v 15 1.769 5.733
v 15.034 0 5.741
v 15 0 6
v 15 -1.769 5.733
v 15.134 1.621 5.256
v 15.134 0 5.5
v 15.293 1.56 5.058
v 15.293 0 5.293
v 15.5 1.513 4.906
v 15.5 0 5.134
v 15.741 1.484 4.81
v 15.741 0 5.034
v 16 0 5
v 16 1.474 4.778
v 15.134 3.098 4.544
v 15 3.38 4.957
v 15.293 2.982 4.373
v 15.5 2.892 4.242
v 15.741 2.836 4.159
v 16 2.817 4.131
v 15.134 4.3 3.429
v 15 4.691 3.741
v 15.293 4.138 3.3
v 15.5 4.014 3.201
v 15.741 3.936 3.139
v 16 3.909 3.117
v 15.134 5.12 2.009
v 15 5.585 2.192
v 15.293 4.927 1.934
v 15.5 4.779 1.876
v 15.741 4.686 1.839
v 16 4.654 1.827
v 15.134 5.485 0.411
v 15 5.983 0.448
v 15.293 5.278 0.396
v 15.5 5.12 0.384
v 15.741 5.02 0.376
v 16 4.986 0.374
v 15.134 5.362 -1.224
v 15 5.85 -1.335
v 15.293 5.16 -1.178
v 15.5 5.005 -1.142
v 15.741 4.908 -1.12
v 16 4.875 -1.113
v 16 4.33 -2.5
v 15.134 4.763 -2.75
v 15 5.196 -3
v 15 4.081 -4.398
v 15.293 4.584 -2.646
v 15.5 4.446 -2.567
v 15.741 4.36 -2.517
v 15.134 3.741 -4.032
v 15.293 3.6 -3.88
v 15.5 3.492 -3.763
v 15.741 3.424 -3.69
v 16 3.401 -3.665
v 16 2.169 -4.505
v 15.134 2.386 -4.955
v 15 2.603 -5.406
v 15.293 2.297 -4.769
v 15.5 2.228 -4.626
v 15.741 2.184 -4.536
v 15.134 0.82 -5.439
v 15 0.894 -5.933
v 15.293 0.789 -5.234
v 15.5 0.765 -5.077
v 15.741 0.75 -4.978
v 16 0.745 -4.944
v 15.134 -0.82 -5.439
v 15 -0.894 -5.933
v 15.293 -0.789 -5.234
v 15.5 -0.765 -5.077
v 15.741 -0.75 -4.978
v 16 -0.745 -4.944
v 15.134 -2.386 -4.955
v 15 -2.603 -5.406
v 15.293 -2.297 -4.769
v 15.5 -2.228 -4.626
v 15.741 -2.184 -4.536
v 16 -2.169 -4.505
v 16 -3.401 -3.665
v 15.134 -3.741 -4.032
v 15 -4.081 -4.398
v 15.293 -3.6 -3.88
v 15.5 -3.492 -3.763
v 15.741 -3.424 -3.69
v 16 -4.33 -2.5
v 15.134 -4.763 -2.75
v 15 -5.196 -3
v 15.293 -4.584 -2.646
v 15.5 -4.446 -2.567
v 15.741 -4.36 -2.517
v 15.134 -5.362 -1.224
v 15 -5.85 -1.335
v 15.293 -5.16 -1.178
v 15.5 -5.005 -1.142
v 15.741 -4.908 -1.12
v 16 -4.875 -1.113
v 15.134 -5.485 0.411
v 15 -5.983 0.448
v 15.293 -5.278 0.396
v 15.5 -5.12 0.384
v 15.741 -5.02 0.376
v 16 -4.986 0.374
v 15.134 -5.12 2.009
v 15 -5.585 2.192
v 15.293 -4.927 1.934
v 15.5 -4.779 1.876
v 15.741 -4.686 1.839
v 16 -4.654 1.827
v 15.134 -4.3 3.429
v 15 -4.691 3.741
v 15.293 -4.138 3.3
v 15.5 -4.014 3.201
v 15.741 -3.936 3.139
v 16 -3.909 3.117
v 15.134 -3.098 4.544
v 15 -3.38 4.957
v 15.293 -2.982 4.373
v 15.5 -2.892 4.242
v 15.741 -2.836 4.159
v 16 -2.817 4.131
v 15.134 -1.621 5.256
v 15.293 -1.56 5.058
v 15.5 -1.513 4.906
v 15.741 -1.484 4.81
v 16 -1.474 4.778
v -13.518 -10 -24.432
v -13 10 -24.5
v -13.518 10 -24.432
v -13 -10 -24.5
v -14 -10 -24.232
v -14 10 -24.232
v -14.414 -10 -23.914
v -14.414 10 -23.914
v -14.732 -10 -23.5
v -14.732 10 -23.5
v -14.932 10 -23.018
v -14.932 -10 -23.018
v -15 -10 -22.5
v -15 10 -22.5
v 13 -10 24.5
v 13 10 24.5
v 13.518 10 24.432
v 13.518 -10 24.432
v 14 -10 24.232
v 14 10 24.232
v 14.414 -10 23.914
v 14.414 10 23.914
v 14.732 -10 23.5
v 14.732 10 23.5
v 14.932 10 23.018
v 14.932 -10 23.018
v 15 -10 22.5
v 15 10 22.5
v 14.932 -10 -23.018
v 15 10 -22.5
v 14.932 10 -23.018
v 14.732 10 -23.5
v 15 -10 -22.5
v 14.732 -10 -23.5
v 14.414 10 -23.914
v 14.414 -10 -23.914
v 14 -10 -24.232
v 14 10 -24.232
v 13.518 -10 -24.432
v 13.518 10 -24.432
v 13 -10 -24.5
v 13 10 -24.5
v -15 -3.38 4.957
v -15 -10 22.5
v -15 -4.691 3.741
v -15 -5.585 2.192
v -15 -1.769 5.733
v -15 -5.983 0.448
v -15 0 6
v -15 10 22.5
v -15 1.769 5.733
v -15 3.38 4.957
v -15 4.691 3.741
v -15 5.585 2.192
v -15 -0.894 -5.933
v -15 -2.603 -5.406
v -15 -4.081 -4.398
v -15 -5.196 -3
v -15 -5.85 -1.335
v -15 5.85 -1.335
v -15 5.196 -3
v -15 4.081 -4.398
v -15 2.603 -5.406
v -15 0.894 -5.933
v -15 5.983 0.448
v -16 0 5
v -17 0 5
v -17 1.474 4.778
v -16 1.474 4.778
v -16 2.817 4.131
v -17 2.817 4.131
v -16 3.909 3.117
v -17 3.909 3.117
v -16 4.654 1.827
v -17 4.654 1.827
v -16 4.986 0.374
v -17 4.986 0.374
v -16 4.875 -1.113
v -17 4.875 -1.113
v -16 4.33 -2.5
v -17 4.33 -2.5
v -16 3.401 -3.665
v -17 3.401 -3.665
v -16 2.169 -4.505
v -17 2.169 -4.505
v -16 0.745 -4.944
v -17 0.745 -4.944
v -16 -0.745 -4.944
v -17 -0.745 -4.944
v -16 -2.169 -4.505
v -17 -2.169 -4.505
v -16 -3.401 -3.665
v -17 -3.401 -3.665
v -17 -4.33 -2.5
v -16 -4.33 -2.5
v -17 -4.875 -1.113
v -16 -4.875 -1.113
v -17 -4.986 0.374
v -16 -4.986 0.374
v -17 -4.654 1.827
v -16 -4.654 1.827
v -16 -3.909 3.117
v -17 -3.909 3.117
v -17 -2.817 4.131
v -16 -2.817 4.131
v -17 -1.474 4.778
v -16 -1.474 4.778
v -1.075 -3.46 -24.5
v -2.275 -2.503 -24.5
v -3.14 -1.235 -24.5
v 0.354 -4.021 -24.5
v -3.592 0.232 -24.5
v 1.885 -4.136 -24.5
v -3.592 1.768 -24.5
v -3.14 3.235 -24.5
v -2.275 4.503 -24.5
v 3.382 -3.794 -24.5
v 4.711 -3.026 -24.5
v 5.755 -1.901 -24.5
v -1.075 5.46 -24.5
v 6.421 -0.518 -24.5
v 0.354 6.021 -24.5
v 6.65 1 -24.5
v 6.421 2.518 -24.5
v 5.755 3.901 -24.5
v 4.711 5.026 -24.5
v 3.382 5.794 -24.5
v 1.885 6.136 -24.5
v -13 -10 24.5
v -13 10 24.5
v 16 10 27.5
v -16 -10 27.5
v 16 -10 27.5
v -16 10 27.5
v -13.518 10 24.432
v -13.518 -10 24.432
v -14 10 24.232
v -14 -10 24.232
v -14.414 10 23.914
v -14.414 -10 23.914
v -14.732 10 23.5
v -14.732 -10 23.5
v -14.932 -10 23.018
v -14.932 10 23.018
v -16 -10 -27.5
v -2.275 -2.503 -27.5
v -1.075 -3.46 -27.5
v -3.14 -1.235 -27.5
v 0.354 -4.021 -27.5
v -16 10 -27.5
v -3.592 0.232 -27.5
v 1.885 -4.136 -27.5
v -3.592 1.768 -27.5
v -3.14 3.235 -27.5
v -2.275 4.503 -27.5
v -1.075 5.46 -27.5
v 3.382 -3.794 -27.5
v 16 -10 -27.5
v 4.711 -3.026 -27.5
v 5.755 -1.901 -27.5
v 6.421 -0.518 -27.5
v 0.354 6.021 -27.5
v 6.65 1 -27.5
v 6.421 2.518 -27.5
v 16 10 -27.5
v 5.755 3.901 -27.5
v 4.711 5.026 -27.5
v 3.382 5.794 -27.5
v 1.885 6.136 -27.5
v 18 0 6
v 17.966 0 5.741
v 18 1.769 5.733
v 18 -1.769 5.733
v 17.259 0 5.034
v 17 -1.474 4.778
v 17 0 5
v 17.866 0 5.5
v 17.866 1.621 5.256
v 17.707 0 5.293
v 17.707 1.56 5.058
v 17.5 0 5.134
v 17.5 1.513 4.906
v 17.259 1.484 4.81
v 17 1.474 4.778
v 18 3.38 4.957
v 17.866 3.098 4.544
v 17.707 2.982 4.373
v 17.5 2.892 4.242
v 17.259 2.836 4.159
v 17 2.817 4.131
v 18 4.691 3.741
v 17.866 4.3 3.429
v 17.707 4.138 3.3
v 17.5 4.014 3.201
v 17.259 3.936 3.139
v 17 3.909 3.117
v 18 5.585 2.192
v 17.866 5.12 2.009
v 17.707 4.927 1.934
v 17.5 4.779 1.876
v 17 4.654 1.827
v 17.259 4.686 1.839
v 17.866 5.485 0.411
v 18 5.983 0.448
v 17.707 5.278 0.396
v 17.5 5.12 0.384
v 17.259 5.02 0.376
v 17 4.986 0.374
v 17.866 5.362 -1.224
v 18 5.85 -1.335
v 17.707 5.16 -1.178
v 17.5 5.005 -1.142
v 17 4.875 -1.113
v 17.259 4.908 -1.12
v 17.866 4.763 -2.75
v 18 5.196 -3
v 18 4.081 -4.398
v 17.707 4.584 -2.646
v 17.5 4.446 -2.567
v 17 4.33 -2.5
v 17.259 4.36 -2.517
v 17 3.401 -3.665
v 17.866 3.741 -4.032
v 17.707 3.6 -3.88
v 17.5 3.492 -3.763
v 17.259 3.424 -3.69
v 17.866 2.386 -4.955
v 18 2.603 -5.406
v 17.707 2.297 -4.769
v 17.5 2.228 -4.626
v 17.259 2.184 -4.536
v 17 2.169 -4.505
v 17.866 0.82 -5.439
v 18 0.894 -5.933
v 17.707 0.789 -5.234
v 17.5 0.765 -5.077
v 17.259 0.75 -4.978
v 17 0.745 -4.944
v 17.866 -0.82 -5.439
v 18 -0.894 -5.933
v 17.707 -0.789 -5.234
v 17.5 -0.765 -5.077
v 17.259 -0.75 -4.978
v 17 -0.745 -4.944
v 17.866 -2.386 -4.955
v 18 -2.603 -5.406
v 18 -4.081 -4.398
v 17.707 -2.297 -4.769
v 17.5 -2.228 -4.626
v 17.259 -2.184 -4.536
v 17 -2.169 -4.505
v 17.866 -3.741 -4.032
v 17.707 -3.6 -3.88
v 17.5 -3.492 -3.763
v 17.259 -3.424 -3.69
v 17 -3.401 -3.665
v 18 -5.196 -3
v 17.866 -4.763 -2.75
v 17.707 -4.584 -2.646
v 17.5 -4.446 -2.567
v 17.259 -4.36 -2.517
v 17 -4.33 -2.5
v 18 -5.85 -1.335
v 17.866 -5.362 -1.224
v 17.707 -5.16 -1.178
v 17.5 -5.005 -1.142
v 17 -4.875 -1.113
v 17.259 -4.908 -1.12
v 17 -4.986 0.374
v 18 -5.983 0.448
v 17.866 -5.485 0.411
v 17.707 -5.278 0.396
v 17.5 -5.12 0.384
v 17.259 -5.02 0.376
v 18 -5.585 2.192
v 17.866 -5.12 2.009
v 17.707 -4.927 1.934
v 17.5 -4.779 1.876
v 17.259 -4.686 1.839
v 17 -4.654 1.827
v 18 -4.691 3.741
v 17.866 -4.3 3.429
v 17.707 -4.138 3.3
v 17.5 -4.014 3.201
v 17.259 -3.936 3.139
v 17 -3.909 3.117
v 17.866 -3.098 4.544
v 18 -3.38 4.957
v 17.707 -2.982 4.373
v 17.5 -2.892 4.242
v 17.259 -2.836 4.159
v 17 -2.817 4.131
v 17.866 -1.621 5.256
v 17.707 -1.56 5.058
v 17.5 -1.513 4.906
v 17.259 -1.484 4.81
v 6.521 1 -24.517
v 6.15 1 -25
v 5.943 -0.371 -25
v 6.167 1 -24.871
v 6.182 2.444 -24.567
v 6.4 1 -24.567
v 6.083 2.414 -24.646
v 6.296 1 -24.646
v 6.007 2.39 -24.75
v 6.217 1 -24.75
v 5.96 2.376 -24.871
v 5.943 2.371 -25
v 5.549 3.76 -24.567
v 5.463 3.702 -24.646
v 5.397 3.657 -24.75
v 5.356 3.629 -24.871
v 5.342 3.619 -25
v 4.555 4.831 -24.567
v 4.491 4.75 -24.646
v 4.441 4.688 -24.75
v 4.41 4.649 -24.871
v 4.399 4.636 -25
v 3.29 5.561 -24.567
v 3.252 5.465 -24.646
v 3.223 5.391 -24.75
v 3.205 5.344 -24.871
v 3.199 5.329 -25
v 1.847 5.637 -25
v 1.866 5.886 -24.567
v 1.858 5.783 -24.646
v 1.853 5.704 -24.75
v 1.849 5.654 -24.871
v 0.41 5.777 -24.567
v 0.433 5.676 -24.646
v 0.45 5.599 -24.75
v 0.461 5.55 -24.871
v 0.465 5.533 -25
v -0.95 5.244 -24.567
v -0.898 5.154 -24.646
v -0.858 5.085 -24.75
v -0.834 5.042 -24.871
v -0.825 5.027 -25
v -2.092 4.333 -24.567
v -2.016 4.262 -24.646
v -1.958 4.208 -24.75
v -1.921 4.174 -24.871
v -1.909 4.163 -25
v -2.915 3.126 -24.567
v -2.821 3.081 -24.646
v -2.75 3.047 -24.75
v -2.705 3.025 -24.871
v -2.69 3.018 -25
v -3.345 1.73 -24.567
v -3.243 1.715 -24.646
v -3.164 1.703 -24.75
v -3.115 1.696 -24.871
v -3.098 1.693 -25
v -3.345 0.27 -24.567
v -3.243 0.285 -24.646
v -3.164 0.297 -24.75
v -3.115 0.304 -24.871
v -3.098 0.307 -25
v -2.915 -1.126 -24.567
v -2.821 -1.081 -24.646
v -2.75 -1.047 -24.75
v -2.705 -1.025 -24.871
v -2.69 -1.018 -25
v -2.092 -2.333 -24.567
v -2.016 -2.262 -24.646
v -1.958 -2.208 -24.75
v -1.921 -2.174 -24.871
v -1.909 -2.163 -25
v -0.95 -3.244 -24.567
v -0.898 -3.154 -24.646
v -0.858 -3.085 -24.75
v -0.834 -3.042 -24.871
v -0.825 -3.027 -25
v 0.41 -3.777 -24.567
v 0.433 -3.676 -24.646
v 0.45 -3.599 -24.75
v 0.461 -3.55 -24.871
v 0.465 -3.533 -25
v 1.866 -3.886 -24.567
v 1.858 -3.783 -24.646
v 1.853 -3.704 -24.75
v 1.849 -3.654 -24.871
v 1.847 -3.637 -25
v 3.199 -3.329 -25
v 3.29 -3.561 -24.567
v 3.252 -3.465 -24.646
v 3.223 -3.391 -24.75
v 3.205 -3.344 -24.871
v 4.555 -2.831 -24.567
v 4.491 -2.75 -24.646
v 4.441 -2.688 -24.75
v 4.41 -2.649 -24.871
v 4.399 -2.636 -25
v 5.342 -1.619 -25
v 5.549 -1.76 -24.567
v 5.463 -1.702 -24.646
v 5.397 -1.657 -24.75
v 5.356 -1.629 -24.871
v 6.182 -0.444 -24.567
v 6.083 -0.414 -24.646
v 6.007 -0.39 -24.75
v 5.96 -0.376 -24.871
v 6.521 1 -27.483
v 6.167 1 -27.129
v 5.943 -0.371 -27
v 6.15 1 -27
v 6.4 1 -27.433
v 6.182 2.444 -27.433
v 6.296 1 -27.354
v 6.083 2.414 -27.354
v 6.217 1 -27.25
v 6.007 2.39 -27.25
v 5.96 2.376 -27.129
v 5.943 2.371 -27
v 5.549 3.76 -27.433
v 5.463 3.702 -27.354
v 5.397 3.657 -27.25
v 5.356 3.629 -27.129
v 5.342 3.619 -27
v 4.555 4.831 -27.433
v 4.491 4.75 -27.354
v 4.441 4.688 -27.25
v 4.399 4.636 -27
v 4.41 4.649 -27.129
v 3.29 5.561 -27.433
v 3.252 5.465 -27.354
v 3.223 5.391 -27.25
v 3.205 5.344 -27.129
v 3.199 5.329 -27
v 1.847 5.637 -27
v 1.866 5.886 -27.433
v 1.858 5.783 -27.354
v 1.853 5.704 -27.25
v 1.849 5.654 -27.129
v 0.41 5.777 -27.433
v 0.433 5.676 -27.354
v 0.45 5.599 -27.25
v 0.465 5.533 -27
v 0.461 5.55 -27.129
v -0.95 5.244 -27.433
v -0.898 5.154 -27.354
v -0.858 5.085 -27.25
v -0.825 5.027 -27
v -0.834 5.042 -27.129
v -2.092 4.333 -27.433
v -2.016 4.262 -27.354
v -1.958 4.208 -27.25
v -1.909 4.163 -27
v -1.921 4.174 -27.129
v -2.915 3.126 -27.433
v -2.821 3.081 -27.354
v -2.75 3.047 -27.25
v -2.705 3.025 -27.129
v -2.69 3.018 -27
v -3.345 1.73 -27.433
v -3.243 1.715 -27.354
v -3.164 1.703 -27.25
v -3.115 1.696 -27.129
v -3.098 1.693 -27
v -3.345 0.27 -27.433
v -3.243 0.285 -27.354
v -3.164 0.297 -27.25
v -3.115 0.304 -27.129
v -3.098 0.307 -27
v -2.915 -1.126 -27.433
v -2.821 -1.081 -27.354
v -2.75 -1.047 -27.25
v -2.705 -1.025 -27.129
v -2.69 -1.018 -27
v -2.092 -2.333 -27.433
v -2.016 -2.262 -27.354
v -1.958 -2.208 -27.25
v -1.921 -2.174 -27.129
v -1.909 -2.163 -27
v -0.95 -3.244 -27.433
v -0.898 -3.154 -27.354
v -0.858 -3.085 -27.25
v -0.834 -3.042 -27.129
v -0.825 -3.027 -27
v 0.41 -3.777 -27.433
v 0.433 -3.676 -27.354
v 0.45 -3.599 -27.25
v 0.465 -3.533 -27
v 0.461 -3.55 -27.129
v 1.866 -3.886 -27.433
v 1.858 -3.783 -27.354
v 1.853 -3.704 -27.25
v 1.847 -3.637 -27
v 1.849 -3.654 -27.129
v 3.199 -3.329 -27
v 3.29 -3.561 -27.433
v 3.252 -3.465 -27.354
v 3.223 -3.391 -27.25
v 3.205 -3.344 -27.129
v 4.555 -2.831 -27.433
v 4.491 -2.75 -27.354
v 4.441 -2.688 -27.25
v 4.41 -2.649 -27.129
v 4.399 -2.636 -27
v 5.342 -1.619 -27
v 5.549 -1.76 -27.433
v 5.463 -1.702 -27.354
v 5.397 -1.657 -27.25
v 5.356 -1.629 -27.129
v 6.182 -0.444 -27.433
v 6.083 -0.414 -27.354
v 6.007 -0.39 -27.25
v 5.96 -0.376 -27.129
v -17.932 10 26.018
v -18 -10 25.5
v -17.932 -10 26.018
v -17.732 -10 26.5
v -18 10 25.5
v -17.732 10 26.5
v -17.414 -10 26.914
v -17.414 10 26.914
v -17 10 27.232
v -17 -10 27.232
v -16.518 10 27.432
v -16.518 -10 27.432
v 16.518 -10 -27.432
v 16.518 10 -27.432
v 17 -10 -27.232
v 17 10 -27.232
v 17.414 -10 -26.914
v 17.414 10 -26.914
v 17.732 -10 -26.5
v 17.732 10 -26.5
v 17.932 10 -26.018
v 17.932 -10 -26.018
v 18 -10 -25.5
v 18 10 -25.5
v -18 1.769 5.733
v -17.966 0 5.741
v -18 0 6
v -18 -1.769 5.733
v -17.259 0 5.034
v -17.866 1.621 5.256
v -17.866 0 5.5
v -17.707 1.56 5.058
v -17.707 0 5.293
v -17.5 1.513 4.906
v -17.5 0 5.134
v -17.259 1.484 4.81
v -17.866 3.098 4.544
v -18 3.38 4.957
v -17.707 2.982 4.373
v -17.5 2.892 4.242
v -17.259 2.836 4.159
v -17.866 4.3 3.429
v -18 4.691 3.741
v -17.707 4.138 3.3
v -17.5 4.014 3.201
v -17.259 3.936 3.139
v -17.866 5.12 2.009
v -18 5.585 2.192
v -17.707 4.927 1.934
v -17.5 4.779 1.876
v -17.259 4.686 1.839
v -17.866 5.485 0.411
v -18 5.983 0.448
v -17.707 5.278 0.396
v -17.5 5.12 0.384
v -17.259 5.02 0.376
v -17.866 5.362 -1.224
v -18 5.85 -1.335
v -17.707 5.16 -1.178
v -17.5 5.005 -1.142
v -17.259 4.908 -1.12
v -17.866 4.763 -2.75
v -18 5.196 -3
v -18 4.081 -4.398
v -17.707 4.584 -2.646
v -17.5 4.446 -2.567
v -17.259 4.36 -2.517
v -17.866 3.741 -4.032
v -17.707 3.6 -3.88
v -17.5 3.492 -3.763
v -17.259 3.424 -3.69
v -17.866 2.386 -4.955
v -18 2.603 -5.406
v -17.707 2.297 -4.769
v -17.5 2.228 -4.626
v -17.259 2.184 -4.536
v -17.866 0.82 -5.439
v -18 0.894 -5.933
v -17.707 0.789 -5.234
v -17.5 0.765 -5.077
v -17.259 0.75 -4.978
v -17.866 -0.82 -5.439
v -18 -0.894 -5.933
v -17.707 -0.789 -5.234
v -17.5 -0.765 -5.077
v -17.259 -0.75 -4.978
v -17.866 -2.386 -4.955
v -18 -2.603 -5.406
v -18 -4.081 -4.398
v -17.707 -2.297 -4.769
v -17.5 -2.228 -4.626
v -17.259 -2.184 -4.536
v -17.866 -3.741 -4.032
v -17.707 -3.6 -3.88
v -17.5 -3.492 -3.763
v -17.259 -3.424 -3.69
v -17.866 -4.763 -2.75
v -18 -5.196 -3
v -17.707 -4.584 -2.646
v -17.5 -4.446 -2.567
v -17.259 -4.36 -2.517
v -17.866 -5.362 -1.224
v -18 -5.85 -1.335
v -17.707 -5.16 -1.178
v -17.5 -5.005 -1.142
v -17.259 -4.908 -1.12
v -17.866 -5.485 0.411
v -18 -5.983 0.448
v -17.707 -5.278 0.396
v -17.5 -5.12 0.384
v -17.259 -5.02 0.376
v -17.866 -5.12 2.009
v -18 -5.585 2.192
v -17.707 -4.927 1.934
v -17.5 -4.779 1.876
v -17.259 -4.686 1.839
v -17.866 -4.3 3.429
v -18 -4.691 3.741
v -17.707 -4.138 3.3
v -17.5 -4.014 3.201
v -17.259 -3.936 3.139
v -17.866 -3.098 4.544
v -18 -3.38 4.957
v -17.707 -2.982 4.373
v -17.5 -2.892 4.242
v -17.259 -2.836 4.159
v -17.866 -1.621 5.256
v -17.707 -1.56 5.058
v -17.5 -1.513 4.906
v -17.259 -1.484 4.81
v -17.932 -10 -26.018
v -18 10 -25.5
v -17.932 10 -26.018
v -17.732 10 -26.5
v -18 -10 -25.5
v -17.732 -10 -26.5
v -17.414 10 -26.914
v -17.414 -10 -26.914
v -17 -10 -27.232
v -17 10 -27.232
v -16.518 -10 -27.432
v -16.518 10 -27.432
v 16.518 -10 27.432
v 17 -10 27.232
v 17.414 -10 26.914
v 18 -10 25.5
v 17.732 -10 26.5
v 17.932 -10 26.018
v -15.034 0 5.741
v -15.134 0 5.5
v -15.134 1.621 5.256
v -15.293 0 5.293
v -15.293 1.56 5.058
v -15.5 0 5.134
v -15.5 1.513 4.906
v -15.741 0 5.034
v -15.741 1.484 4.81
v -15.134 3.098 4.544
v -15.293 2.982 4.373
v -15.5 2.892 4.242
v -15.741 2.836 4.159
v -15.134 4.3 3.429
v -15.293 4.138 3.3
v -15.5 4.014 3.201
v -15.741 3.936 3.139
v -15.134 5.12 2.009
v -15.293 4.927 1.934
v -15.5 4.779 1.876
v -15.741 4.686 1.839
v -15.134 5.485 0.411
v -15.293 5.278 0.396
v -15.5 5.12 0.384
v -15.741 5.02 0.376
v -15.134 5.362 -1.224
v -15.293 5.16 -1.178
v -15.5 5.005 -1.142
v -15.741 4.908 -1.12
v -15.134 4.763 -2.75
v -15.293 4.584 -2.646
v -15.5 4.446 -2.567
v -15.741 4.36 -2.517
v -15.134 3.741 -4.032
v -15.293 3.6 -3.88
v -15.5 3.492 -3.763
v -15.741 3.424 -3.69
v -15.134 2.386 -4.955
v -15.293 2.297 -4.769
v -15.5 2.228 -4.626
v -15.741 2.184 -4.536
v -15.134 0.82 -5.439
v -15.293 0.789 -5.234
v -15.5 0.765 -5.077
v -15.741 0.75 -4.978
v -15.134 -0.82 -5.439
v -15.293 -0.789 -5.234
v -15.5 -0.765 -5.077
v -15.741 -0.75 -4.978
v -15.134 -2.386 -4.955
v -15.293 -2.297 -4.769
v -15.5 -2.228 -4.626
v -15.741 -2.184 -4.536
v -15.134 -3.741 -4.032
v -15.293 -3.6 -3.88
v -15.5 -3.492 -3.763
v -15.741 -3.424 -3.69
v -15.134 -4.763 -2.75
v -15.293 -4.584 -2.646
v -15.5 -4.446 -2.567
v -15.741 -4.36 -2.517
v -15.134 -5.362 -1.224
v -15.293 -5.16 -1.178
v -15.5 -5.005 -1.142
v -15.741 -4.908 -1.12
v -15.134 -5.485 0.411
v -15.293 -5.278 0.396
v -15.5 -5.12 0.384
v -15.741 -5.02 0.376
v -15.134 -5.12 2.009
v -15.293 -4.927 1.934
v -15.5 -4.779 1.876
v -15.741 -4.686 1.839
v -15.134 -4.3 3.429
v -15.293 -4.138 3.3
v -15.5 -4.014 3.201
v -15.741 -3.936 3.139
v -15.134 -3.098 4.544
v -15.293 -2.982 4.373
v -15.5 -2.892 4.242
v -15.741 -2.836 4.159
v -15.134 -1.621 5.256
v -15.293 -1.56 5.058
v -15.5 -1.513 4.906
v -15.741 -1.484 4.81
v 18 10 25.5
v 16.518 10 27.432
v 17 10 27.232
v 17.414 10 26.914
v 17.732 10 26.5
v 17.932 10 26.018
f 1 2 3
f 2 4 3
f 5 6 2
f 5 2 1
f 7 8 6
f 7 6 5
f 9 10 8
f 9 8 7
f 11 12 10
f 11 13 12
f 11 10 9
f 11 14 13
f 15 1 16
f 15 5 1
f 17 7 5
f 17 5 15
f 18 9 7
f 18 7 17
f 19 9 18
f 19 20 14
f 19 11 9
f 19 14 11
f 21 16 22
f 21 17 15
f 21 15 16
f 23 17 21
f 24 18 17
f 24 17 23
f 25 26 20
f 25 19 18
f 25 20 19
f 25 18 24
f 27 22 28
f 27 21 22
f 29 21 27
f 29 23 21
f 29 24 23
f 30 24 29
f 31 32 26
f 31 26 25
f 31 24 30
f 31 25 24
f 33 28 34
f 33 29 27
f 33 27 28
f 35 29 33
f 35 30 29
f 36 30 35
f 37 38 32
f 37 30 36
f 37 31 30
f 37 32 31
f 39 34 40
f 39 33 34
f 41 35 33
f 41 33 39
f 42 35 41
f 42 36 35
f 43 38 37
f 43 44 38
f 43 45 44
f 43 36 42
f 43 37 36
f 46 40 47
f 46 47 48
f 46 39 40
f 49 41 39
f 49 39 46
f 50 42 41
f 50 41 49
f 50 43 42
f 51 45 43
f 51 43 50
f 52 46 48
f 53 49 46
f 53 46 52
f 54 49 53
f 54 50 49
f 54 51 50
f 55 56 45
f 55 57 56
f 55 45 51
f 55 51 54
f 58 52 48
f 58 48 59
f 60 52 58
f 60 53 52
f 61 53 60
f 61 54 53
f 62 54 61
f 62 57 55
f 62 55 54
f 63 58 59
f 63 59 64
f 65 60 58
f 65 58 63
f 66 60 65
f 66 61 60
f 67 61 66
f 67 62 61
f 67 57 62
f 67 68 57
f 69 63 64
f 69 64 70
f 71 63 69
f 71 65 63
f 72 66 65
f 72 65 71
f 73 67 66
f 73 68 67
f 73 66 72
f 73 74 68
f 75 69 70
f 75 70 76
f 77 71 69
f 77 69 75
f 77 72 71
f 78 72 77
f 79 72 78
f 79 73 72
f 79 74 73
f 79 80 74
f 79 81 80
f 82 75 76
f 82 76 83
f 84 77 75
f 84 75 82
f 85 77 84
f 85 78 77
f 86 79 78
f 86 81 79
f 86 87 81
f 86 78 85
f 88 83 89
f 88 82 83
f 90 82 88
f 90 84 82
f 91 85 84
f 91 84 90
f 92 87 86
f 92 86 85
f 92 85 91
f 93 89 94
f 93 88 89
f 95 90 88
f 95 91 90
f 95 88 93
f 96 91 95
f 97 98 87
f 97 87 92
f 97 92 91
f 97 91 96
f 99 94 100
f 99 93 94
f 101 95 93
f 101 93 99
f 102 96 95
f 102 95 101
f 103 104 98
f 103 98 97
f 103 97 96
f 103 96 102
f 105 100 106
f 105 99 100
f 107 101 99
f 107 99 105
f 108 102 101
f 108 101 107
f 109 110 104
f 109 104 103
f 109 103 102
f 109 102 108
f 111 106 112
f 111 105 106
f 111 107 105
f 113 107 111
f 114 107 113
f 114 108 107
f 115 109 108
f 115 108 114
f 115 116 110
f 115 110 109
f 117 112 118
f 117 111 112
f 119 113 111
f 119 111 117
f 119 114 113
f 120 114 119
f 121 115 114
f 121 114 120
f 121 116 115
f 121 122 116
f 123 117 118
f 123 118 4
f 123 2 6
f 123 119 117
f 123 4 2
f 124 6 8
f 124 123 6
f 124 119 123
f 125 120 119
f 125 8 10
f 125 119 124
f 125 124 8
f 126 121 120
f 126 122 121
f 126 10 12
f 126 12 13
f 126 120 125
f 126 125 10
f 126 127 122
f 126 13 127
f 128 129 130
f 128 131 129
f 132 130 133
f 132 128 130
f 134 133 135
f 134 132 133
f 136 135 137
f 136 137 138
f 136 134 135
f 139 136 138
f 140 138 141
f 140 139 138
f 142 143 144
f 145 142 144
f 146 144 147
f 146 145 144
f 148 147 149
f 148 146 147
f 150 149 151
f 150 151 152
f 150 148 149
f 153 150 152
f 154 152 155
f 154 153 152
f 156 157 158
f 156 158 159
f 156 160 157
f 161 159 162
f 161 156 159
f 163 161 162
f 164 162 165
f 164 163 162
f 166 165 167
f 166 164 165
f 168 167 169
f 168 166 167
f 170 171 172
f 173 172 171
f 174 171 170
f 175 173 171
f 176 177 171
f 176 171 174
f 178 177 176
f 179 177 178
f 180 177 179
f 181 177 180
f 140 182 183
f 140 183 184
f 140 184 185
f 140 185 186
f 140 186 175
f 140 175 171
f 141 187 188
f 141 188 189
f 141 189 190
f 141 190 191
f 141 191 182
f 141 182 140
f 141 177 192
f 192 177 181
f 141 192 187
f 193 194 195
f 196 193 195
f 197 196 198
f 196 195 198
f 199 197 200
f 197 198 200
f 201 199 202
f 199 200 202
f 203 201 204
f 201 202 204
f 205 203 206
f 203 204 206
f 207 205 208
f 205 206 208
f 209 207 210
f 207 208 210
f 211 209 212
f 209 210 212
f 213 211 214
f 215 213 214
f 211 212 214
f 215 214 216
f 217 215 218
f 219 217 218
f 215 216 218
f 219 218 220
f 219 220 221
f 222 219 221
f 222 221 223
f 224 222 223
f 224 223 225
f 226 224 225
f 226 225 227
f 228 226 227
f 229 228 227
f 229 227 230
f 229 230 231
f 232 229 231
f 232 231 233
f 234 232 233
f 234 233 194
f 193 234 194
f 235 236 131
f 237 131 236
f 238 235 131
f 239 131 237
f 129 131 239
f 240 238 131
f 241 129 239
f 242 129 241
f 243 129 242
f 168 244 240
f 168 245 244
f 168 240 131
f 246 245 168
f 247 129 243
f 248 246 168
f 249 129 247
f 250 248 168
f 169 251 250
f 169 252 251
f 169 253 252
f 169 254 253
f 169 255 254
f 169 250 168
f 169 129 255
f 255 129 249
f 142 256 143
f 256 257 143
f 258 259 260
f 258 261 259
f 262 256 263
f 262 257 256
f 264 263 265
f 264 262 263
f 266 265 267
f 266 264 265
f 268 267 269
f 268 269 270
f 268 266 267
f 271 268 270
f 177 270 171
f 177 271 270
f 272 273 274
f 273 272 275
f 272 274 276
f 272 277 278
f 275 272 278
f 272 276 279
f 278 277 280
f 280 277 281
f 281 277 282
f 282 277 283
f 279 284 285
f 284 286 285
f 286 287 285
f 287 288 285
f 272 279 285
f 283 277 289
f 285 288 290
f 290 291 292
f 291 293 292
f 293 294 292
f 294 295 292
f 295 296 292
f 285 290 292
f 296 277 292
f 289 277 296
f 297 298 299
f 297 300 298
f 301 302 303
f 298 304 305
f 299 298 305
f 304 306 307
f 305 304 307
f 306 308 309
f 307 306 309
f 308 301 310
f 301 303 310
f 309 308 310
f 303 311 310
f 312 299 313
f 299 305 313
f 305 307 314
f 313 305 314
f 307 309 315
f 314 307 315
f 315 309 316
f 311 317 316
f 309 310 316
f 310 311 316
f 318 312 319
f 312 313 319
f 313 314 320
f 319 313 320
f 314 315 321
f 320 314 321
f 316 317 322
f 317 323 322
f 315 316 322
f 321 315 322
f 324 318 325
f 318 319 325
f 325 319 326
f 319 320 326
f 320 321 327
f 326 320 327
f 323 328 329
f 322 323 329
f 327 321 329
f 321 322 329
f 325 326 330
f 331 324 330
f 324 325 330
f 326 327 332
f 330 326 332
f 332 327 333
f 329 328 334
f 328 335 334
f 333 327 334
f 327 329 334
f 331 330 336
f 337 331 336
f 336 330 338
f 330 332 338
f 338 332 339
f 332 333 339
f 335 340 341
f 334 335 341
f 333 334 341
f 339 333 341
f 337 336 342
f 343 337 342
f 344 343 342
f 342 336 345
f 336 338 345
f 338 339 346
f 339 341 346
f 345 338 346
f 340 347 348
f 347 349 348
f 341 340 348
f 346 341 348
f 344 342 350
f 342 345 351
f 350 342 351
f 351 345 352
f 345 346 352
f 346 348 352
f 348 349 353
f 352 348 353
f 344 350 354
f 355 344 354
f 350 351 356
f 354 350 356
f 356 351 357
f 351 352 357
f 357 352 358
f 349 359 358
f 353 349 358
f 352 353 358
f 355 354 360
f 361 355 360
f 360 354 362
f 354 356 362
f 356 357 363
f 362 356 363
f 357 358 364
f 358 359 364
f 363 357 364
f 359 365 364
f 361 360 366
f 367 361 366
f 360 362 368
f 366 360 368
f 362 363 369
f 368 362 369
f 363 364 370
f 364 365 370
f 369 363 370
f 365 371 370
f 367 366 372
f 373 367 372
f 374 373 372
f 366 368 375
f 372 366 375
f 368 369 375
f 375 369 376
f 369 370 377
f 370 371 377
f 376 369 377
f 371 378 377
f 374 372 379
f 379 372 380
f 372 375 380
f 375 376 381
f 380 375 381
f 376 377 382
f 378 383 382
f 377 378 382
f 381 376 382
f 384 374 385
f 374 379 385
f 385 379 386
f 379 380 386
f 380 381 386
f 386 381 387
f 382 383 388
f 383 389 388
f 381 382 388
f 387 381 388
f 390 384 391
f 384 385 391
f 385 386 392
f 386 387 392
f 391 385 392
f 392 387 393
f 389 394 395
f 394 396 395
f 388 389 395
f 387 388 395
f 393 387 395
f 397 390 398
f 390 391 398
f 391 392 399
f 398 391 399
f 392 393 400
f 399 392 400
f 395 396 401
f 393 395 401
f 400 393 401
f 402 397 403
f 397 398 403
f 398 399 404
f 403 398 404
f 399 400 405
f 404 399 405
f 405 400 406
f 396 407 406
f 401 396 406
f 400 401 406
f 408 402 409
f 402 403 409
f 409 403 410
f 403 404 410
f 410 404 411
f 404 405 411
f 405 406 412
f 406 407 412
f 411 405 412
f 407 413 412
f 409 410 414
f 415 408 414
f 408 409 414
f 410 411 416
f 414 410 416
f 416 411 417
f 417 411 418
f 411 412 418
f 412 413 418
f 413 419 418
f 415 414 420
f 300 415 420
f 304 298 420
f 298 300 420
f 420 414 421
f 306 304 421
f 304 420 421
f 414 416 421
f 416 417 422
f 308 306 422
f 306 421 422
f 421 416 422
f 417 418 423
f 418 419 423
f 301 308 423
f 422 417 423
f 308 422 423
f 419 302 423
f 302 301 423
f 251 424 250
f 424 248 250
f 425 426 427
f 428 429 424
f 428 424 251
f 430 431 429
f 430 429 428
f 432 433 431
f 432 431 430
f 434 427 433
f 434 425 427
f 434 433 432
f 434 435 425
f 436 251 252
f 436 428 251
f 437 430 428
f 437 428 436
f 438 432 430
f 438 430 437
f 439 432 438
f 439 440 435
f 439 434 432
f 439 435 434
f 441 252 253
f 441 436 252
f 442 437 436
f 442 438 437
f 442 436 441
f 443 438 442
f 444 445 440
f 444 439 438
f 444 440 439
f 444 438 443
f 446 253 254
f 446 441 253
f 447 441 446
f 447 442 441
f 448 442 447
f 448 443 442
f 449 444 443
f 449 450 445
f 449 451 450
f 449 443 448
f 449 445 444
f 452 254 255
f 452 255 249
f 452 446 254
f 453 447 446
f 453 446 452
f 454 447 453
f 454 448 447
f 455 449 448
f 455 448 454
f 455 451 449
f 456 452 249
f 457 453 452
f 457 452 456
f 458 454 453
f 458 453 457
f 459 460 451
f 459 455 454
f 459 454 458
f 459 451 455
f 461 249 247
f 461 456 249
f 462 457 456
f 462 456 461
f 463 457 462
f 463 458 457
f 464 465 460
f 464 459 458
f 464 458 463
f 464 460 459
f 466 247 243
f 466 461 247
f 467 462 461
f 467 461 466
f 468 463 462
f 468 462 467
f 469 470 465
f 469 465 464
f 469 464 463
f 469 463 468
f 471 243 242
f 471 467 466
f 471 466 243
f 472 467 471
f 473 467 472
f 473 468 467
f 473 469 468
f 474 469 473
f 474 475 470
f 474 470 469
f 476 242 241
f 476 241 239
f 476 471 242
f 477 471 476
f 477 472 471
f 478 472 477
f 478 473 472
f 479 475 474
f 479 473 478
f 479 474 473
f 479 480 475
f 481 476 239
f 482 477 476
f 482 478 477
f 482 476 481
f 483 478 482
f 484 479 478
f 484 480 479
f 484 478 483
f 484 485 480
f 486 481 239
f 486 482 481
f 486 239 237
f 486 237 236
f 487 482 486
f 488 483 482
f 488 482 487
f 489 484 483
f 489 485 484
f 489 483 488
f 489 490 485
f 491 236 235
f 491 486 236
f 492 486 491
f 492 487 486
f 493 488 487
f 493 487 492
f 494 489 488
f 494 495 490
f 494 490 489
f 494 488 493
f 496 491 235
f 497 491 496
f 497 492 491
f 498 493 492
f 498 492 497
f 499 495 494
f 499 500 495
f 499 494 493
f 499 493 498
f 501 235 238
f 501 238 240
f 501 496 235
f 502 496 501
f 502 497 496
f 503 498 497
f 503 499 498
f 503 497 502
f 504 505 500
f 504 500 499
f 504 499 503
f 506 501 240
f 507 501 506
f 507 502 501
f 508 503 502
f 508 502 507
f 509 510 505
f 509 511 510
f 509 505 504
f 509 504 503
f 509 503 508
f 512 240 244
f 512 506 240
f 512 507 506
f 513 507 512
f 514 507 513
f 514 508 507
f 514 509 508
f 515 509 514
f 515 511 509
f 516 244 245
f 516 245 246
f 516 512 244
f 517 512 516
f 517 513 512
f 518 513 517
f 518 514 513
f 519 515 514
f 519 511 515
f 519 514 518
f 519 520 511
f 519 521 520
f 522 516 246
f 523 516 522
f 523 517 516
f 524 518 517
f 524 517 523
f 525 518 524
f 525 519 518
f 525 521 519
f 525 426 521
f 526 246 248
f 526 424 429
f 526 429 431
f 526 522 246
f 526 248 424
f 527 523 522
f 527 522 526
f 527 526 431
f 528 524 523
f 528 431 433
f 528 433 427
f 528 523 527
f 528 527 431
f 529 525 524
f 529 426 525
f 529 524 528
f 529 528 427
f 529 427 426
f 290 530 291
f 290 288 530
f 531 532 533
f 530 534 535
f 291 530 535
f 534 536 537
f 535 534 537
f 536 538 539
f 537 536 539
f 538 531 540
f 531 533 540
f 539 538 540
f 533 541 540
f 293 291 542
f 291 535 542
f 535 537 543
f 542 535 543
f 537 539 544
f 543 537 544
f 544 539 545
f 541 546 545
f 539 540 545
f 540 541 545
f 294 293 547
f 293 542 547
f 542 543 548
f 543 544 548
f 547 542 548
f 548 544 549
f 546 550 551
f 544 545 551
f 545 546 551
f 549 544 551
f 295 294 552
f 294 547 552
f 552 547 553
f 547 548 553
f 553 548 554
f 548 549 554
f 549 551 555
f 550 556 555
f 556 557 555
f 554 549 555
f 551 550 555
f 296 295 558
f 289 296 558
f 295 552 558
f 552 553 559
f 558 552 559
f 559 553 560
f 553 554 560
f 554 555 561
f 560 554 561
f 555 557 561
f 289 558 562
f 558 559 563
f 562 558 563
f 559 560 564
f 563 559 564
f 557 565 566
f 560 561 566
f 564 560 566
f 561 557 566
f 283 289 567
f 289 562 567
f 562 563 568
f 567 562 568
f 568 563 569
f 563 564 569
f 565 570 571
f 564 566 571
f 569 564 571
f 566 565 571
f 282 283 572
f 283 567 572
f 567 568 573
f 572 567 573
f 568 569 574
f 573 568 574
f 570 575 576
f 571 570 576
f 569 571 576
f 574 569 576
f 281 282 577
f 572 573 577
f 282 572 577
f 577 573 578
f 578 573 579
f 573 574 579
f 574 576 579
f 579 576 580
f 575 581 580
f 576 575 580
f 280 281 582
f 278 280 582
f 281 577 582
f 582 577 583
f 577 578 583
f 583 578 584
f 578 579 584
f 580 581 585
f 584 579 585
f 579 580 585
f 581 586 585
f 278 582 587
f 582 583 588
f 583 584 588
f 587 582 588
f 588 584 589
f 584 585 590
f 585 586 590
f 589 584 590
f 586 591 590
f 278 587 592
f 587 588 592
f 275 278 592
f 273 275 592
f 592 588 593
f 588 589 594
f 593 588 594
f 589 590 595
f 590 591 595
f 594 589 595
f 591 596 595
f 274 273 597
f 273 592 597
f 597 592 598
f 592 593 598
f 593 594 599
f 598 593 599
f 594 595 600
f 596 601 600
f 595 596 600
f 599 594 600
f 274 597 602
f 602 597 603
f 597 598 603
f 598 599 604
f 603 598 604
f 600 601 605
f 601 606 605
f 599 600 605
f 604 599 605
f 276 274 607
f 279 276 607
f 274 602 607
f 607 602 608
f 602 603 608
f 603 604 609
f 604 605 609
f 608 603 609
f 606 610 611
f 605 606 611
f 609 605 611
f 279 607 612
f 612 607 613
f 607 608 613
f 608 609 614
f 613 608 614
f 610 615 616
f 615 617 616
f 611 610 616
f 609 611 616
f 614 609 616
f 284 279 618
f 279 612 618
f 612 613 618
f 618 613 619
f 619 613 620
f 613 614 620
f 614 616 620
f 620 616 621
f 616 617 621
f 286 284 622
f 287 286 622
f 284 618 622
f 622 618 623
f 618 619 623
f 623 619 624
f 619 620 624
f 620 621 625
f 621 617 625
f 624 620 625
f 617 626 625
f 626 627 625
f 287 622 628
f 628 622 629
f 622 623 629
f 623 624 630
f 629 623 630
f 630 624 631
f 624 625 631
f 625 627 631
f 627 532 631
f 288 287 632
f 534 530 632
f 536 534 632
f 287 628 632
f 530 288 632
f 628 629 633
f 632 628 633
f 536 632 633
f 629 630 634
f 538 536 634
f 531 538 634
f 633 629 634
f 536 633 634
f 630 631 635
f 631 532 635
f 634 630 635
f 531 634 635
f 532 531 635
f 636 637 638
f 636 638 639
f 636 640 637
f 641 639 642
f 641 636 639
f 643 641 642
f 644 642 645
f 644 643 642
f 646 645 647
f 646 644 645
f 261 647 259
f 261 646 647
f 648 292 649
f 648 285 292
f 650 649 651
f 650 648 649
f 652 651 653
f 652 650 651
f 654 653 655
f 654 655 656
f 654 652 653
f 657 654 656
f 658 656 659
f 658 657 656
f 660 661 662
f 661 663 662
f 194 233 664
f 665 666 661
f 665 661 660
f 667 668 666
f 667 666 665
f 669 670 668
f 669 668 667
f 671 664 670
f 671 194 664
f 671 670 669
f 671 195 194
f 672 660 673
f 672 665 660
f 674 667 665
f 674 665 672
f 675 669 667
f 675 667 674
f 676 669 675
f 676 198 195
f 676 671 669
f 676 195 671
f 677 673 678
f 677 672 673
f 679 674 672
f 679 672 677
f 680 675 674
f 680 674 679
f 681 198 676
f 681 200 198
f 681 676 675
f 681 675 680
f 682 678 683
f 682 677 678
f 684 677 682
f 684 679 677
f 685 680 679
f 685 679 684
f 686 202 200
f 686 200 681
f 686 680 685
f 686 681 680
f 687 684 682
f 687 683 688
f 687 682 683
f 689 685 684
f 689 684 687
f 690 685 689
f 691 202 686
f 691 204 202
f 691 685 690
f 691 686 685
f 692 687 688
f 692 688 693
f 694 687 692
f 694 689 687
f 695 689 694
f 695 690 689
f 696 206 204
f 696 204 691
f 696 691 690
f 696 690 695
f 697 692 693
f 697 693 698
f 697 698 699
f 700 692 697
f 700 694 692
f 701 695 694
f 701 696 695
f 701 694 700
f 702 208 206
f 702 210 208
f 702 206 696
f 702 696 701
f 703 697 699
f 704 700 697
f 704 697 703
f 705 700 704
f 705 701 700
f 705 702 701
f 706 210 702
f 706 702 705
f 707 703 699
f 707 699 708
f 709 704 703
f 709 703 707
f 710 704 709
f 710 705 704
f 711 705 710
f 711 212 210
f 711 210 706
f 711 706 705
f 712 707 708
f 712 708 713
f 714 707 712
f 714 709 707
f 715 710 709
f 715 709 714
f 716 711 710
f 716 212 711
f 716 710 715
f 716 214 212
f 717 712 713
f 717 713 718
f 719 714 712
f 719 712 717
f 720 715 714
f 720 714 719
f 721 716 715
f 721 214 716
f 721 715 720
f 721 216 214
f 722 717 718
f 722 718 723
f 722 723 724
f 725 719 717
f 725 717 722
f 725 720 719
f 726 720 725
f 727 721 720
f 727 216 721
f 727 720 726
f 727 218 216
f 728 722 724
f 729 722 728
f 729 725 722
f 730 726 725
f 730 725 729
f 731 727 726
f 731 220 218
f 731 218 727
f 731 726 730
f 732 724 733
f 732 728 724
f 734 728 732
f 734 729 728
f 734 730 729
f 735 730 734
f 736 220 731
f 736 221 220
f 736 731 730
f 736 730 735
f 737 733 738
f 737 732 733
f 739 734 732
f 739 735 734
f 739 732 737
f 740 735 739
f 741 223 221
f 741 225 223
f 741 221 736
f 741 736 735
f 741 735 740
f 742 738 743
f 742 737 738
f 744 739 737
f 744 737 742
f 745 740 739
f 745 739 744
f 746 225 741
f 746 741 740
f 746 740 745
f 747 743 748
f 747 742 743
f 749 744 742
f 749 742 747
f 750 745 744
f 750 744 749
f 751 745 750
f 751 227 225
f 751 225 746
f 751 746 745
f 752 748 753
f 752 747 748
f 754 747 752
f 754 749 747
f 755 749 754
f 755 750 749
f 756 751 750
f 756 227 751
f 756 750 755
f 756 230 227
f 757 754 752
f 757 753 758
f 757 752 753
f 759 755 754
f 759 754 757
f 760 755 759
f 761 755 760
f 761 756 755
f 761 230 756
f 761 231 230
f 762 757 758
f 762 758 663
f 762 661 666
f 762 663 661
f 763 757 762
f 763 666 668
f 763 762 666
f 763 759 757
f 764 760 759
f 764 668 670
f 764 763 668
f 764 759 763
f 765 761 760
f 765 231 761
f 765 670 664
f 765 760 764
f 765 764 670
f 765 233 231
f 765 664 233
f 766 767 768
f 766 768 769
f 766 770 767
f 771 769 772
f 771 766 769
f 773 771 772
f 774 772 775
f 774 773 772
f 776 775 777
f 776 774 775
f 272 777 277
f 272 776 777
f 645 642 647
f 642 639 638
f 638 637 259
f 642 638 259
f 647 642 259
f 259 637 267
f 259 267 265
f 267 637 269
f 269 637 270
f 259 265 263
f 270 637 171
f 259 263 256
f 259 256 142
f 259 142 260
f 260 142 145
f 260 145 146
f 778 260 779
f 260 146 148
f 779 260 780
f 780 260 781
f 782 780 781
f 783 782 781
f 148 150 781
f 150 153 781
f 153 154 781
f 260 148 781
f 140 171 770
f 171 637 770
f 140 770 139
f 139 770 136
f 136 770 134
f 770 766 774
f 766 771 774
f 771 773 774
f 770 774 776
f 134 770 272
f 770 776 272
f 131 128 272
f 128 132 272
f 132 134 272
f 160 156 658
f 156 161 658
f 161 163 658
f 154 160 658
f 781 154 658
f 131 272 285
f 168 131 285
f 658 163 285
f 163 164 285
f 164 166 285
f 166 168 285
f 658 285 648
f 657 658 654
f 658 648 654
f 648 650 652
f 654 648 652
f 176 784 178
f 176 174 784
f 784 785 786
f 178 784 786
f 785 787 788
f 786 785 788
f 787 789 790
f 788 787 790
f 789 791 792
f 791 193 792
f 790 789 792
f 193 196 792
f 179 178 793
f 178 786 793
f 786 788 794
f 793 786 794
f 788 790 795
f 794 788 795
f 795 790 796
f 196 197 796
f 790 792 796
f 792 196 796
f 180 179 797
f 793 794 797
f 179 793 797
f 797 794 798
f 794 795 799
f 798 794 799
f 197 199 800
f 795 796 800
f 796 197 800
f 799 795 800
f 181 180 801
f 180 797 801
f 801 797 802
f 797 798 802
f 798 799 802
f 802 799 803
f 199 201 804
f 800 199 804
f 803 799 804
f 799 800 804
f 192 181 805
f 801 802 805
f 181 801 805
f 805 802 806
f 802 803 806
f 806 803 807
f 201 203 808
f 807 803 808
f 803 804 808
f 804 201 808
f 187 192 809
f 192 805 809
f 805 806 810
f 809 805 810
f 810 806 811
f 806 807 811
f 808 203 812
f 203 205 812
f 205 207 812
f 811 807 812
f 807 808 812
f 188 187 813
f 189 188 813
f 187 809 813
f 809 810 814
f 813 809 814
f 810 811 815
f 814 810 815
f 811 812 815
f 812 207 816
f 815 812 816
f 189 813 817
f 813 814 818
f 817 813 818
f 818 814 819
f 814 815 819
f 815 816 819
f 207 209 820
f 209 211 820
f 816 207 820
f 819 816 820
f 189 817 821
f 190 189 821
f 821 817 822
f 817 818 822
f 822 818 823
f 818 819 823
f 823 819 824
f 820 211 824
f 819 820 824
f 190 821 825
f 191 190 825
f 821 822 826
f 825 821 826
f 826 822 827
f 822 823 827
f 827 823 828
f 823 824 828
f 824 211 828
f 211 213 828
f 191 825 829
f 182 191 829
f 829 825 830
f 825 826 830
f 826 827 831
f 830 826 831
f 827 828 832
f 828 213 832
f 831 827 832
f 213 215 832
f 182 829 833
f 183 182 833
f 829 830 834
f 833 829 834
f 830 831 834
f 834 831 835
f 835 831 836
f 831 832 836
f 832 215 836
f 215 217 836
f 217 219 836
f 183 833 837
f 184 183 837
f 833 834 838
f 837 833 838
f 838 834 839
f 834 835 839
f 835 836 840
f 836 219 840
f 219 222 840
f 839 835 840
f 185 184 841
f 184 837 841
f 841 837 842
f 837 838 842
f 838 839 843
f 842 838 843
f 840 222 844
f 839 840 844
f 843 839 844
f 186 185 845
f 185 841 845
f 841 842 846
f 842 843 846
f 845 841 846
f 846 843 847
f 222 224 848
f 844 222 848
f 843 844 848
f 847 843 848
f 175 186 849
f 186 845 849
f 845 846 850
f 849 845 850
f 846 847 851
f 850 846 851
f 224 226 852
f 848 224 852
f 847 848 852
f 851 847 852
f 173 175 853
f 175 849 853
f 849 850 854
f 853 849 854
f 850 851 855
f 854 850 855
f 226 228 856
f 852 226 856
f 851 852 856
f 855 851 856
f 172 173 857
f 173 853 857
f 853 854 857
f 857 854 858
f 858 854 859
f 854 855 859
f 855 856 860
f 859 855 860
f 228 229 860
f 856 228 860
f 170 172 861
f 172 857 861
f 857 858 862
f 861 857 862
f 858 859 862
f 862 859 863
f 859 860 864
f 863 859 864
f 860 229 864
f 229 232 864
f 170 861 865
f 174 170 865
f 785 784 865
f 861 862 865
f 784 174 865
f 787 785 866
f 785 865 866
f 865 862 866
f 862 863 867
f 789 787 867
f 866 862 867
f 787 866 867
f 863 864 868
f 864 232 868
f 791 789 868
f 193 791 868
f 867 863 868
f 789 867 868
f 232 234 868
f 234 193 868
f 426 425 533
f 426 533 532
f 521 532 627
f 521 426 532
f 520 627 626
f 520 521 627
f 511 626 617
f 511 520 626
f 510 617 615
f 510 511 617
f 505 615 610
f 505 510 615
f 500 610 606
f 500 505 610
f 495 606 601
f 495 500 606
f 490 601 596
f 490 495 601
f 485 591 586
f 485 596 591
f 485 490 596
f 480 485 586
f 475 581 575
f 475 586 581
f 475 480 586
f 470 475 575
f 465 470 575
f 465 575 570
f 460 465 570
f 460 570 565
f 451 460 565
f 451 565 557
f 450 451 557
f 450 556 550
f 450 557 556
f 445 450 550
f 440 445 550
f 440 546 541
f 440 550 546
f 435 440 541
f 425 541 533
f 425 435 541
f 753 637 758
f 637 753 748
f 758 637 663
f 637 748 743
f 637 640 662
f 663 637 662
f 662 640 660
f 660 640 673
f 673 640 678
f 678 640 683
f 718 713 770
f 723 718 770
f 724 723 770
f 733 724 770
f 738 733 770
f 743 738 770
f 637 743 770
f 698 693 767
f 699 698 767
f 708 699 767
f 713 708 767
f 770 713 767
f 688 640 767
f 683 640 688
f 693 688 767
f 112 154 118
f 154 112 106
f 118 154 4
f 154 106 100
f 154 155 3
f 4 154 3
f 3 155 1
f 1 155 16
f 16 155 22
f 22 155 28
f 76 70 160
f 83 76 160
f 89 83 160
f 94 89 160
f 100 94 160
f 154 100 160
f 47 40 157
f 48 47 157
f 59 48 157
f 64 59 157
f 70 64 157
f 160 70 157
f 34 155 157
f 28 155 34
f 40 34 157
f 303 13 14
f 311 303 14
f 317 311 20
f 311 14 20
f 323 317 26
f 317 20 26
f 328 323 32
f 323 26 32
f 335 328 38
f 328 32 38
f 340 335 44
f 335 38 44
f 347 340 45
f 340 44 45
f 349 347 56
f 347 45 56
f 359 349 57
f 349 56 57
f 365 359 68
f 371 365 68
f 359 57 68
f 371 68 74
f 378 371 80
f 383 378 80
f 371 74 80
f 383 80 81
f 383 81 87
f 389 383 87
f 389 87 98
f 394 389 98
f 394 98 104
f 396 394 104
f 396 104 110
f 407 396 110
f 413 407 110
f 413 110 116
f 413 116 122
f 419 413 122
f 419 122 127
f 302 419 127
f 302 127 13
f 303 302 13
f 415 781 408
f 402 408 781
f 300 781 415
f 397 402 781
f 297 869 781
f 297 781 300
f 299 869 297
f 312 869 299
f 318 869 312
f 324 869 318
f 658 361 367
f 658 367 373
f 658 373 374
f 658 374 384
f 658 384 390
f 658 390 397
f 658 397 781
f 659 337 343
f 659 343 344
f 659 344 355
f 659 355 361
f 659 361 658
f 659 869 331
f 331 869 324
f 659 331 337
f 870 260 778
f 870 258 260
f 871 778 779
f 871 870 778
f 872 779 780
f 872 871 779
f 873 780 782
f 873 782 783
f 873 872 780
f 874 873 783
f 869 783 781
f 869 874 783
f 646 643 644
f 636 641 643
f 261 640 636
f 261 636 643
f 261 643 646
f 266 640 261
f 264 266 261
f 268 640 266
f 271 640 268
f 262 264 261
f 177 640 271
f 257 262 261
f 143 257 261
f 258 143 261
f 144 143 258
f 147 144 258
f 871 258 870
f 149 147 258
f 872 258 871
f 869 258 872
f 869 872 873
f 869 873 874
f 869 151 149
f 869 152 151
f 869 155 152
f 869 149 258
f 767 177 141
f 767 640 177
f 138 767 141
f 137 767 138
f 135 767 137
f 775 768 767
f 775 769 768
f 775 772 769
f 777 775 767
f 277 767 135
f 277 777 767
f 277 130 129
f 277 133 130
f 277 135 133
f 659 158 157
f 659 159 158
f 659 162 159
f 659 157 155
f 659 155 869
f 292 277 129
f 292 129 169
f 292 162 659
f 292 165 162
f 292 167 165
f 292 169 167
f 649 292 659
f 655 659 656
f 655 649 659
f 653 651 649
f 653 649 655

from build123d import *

# Parameters (mm, degrees)
ESBO_O1_W                  = 36
ESBO_O1_H                  = 55
ESBO_O1_W_2                = 30
ESBO_O1_H_2                = 49
SALIENTE_EXTRUIR1_DEPTH    = 10
CORTAR_EXTRUIR4_REACH      = 48.392
CROQUIS8_R                 = 5
REDONDEO1_R                = 2
REDONDEO2_R                = 2
CORTAR_EXTRUIR5_DEPTH      = 59.72818744
CORTAR_EXTRUIR5_DEPTH_BACK = 5
CROQUIS9_R                 = 4.65
REDONDEO5_R                = 0.5
REDONDEO6_R                = 1


with BuildPart() as part:
    # Esboço1 → Saliente-Extruir1 (new, symmetric)
    with BuildSketch(Plane(origin=(0, 0, 0), x_dir=(1, 0, 0), z_dir=(0, 1, 0))):
        Rectangle(ESBO_O1_W, ESBO_O1_H)
        Rectangle(ESBO_O1_W_2, ESBO_O1_H_2, mode=Mode.SUBTRACT)
    extrude(amount=SALIENTE_EXTRUIR1_DEPTH, both=True)

    # Cortar-Extruir4: up to this face of the body (flat: up to its plane)
    cortar_extruir4_end = Plane(part.part.faces().sort_by_distance((18, 0, 0))[0])
    # Croquis8 → Cortar-Extruir4 (cut, up to the picked face)
    with BuildSketch(Plane.ZY.offset(18), mode=Mode.PRIVATE) as cortar_extruir4_sk1:
        Circle(CROQUIS8_R)
    cortar_extruir4_tool1 = split(extrude(cortar_extruir4_sk1.sketch, amount=-CORTAR_EXTRUIR4_REACH, mode=Mode.PRIVATE), bisect_by=cortar_extruir4_end, keep=Keep.BOTH, mode=Mode.PRIVATE)
    add(cortar_extruir4_tool1.solids().sort_by(Axis((-18, 0, 0), (1, 0, 0)))[0], mode=Mode.SUBTRACT)

    # Redondeo1
    redondeo1_edges = [part.edges().sort_by_distance(p)[0] for p in [
        (18, 0, 27.5),
        (-18, 0, 27.5),
        (-18, 0, -27.5),
        (18, 0, -27.5),
    ]]
    fillet(redondeo1_edges, radius=REDONDEO1_R)

    # Redondeo2
    redondeo2_edges = [part.edges().sort_by_distance(p)[0] for p in [
        (-15, 0, -24.5),
        (-15, 0, 24.5),
        (15, 0, 24.5),
        (15, 0, -24.5),
    ]]
    fillet(redondeo2_edges, radius=REDONDEO2_R)

    # Croquis9 → Cortar-Extruir5 (cut, two sides: drawn at the far end of the back side and taken through both)
    with BuildSketch(Plane(origin=(0, 0, -27.5), x_dir=(-1, 0, 0), z_dir=(0, 0, -1)).offset(-CORTAR_EXTRUIR5_DEPTH_BACK)):
        with Locations(Location((-1.5, 1, 0), (0, 0, 180))):
            Circle(CROQUIS9_R)
    extrude(amount=CORTAR_EXTRUIR5_DEPTH + CORTAR_EXTRUIR5_DEPTH_BACK, mode=Mode.SUBTRACT)

    # Redondeo5
    redondeo5_edges = [part.edges().sort_by_distance(p)[0] for p in [
        (-3.15, 1, -24.5),
        (-3.15, 1, -27.5),
    ]]
    fillet(redondeo5_edges, radius=REDONDEO5_R)

    # Redondeo6
    redondeo6_edges = [part.edges().sort_by_distance(p)[0] for p in [
        (15, 0, -5),
        (-15, 0, -5),
        (-18, 0, -5),
        (18, 0, -5),
    ]]
    fillet(redondeo6_edges, radius=REDONDEO6_R)


solid = part.part
